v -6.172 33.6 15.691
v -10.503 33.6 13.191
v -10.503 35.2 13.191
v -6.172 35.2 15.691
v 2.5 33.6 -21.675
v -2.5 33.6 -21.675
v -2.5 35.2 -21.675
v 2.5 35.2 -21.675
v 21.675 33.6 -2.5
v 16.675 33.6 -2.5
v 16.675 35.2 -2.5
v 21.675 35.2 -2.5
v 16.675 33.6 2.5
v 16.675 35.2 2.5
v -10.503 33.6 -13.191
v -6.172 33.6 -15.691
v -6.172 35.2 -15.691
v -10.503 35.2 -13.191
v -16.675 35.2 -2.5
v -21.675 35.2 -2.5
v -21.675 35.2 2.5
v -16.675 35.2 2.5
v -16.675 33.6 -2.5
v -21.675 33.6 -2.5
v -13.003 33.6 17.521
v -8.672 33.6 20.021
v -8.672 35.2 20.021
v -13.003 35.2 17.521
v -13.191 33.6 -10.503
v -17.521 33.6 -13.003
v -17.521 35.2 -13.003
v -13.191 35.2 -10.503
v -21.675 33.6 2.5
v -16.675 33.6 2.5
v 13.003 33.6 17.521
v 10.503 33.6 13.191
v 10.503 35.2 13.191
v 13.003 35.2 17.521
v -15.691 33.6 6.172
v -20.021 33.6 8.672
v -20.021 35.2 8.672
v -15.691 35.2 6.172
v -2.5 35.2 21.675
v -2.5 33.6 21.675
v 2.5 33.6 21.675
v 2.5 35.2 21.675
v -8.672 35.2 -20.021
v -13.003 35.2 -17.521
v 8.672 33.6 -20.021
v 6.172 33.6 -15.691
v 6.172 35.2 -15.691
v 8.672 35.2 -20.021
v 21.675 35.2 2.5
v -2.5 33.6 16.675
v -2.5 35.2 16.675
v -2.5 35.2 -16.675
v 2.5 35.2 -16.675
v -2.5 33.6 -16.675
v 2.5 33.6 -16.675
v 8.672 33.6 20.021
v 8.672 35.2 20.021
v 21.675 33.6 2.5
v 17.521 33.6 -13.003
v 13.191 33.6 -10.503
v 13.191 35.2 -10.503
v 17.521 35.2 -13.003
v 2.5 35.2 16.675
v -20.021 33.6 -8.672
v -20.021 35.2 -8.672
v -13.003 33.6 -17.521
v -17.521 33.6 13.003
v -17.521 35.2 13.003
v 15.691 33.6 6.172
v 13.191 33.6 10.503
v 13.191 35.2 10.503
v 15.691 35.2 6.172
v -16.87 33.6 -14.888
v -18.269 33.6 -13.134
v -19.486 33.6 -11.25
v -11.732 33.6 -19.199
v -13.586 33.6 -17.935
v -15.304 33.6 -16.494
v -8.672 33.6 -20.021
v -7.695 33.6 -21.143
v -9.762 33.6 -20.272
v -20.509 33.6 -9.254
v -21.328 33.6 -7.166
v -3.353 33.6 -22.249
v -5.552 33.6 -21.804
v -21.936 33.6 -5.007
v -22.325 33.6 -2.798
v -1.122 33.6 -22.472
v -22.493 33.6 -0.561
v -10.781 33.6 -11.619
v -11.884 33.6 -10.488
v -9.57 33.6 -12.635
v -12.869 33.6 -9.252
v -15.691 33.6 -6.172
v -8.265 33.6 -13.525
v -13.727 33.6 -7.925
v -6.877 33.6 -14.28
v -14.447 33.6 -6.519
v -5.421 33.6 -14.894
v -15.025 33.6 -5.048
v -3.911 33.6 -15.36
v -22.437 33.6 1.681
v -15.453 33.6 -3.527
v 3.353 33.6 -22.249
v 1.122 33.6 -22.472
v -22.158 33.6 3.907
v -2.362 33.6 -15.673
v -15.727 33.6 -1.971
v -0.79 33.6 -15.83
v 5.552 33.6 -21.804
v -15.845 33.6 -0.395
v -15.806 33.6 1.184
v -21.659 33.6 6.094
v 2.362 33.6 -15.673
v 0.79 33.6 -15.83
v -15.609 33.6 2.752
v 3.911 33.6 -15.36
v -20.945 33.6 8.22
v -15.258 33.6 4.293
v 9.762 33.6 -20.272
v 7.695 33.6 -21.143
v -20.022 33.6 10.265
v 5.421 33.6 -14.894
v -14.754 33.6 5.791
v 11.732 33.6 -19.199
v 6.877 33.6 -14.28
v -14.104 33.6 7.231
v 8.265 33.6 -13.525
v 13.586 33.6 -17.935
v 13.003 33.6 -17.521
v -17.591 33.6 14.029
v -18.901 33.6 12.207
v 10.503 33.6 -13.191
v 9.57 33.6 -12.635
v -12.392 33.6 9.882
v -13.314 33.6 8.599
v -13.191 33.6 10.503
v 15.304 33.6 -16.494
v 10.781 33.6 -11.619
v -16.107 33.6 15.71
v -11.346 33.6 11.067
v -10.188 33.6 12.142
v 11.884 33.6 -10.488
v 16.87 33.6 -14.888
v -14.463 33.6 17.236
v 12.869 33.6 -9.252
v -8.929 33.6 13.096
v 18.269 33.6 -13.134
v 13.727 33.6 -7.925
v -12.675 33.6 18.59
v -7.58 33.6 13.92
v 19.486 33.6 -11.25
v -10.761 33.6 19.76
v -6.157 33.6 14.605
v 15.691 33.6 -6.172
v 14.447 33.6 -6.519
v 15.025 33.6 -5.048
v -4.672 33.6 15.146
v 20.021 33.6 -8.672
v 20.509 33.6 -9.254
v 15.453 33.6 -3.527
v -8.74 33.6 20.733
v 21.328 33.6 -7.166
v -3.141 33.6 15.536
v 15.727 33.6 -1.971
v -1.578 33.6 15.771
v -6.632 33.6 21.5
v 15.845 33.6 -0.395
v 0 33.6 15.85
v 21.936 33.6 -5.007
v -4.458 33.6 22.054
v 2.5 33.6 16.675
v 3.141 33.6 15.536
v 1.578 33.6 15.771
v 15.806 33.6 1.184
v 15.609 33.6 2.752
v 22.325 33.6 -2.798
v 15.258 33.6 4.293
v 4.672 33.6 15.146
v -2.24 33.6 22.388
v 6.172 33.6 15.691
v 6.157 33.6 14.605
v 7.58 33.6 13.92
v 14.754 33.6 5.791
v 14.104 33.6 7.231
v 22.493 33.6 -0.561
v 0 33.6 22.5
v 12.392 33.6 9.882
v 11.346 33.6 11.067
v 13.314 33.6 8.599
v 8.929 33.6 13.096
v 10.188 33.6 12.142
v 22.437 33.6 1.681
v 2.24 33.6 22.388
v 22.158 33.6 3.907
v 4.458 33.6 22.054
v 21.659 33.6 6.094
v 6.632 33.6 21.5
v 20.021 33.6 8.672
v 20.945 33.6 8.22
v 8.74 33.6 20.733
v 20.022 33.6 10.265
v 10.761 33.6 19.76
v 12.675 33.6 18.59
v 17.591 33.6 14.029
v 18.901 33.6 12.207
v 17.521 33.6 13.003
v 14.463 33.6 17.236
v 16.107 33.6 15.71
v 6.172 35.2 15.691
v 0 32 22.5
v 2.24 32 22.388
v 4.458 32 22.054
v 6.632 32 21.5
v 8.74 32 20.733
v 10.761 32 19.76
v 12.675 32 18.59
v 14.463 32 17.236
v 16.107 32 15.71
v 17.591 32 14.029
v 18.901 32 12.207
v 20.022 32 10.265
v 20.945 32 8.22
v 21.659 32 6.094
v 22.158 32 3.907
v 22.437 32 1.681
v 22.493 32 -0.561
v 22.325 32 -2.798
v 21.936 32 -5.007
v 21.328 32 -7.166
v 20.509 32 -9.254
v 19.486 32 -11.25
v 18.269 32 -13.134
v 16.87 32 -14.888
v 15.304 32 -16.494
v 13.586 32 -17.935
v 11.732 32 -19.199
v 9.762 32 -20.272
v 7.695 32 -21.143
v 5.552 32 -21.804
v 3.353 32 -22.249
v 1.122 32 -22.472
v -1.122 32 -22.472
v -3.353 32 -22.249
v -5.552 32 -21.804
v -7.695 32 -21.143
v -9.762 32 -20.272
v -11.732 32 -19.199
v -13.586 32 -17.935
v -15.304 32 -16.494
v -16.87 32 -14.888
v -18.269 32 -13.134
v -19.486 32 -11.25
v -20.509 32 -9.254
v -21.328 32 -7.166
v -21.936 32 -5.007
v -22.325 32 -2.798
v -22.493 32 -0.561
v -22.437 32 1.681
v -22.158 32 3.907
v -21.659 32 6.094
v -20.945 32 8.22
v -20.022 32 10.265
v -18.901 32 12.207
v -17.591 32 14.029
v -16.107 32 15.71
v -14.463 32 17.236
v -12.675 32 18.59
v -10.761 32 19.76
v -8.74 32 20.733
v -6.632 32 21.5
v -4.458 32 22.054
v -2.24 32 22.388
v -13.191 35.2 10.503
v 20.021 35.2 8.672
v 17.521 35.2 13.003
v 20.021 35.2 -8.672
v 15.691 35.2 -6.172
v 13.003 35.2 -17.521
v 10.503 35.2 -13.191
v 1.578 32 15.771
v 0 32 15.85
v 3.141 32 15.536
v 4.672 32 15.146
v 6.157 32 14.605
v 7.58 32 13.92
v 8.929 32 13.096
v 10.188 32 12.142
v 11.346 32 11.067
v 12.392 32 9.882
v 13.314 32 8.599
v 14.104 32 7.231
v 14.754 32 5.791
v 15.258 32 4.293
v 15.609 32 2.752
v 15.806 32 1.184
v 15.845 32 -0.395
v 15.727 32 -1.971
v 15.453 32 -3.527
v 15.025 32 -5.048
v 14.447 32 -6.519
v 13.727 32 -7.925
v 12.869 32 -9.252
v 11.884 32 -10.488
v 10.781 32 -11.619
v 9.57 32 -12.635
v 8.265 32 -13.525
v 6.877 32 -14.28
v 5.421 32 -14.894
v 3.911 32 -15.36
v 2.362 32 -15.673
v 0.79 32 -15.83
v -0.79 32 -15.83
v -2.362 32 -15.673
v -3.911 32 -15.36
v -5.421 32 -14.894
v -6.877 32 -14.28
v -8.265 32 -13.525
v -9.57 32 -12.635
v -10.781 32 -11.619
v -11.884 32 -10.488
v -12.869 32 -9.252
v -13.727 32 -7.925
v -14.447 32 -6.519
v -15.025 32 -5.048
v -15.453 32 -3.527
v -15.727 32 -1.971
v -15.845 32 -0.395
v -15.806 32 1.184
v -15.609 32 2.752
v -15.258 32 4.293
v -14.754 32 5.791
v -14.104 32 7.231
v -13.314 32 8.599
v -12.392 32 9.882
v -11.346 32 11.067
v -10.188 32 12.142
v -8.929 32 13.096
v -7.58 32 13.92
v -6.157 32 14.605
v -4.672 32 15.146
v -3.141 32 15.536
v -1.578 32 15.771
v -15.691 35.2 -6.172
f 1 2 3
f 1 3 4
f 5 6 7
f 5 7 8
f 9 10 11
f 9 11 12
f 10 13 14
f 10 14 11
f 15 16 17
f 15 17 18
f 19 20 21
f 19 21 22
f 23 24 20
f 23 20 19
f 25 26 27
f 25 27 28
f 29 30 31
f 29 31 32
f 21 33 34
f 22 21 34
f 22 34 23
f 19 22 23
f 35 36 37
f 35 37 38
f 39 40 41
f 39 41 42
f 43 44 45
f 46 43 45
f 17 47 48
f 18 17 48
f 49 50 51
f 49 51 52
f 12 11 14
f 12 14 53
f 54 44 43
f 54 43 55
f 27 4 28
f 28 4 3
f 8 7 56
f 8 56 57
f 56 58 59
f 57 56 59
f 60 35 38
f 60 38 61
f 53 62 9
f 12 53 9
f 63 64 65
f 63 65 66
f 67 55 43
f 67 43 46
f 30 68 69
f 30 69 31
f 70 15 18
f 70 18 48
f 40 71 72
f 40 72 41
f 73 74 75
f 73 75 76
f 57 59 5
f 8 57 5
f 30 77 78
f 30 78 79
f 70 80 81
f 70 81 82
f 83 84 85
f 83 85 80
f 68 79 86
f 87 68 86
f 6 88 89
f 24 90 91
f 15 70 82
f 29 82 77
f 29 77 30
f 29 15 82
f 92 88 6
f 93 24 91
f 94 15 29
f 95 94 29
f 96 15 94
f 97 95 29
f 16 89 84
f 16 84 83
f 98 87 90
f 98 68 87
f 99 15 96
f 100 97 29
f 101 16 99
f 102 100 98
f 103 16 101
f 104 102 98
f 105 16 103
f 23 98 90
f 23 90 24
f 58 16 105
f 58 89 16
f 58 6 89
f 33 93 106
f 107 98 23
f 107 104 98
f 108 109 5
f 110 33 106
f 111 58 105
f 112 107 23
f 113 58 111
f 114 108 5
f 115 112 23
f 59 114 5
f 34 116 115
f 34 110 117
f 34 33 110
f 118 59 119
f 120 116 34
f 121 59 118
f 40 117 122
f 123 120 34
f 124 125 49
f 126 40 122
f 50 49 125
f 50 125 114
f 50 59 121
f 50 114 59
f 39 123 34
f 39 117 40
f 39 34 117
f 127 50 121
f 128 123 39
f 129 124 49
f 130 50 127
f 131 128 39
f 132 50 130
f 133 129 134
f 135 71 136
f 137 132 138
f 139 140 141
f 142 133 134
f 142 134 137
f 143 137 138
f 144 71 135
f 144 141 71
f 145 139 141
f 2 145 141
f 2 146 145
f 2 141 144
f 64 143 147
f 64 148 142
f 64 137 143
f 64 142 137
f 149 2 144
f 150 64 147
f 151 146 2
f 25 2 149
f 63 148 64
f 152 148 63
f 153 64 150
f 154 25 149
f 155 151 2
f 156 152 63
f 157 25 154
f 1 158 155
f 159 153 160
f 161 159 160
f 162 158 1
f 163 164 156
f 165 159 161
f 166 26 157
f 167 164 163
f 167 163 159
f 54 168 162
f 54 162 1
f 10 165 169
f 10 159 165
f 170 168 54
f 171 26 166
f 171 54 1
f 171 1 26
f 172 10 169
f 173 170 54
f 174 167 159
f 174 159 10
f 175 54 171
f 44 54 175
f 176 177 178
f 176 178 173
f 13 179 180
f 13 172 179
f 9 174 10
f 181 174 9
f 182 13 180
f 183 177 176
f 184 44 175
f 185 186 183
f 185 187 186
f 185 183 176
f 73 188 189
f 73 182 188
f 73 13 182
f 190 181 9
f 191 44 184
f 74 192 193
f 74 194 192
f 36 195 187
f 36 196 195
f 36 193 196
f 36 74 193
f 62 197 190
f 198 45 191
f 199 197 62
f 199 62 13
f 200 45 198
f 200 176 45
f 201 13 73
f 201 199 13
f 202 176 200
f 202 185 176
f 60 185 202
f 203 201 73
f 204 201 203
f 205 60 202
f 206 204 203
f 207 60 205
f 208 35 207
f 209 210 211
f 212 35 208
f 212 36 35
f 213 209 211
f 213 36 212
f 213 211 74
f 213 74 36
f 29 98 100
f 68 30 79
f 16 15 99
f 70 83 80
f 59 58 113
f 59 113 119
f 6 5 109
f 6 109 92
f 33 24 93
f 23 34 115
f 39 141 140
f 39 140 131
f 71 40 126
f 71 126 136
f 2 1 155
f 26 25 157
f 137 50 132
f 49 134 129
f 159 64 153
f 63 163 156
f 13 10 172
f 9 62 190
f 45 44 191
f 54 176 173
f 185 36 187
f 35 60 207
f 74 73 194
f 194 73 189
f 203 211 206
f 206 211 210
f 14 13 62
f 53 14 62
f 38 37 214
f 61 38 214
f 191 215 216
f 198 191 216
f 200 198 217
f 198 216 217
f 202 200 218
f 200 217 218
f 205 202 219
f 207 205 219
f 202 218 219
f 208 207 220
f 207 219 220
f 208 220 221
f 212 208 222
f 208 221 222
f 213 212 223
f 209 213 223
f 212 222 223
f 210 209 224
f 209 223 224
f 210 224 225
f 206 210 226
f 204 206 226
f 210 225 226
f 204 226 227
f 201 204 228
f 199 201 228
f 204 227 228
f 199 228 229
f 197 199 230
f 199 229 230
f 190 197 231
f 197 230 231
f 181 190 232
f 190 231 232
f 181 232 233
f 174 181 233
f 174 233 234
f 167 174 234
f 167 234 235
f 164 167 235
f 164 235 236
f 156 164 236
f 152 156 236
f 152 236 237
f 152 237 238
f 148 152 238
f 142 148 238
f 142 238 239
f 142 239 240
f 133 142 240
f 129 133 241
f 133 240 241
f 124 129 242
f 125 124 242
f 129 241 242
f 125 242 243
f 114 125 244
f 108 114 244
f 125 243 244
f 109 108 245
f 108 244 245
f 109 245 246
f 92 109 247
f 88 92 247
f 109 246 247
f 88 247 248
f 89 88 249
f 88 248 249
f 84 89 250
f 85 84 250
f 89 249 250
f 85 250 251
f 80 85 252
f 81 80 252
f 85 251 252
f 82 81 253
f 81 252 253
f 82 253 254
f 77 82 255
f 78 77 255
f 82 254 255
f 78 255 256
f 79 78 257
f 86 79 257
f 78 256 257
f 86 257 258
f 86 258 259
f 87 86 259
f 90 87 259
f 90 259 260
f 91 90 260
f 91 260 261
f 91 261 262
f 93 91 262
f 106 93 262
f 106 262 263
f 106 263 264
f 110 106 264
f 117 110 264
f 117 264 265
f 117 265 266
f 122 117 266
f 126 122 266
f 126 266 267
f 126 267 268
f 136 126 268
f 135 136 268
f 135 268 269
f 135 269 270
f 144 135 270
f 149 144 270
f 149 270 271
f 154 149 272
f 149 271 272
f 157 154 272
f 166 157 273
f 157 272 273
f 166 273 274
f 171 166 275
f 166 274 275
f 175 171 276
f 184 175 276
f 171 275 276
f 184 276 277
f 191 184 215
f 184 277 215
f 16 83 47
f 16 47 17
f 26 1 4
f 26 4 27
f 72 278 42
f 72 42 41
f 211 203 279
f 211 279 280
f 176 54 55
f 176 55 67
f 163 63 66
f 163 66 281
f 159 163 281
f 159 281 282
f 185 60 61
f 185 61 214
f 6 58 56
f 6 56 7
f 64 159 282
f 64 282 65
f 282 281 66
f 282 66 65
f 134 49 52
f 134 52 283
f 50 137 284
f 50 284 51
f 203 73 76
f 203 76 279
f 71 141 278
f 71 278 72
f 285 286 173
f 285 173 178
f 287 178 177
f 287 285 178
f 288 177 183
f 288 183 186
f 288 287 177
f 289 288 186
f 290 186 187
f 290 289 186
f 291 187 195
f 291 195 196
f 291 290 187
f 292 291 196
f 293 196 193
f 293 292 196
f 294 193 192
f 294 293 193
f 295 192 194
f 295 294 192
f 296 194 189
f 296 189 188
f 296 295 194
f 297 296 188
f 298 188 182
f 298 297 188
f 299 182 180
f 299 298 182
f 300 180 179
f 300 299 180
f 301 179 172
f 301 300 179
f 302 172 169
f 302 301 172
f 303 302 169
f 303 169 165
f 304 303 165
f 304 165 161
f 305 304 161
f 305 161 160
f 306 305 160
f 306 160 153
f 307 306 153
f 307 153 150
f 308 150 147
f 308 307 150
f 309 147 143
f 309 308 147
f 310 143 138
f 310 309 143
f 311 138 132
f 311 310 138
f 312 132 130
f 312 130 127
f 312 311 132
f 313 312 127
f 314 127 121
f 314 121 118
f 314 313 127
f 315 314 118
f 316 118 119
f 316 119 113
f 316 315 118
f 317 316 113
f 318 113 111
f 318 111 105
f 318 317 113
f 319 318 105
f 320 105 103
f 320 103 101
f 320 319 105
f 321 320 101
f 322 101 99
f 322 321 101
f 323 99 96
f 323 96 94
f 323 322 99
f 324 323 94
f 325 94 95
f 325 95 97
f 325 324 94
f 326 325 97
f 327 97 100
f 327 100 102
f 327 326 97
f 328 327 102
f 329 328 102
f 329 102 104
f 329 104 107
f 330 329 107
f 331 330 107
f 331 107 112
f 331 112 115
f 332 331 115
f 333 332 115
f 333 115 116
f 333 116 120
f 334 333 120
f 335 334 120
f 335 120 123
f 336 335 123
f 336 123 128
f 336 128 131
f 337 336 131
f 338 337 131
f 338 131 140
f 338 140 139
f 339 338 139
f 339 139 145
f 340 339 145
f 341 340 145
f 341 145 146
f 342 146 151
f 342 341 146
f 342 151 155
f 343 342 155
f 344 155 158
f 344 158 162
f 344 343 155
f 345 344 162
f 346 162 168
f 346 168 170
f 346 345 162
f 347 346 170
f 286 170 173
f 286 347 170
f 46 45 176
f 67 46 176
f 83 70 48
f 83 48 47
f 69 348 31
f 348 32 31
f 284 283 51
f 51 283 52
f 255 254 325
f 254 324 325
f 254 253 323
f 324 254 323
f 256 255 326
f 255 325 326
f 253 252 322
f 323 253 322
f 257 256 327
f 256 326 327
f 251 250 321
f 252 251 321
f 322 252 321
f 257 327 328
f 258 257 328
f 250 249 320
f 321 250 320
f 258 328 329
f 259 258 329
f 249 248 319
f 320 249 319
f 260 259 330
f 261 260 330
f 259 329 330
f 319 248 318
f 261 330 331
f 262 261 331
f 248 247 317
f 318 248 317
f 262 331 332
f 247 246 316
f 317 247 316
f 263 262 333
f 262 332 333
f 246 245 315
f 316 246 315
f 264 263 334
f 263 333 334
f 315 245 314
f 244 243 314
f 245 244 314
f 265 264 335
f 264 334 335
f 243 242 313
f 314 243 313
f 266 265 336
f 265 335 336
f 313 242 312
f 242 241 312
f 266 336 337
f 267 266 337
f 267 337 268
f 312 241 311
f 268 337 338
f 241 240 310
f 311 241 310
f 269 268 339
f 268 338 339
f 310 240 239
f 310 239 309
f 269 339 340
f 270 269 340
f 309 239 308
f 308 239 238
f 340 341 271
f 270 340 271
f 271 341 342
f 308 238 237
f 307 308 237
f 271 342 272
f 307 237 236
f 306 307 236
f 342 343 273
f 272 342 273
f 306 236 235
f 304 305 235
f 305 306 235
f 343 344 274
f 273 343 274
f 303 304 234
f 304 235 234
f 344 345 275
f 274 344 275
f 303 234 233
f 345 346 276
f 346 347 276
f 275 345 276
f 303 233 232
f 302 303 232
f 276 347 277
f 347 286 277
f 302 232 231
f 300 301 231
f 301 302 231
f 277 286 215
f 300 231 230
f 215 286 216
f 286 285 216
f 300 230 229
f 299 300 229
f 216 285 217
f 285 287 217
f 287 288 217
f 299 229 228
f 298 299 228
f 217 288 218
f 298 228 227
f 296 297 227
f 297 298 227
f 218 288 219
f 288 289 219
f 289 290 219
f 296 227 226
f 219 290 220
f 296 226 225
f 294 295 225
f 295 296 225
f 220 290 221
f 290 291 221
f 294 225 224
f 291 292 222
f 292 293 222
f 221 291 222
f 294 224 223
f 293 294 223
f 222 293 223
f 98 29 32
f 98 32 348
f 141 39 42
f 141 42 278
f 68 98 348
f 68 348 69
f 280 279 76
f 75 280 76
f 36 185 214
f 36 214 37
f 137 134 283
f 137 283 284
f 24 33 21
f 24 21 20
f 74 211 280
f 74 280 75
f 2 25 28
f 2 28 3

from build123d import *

# Parameters (mm, degrees)
PCB_START   = 32
SKETCH1_R   = 22.5
SKETCH1_R_2 = 15.85
PCB_DEPTH   = 1.6
LEDS_START  = 33.6
SKETCH2_W   = 5
SKETCH2_H   = 5
LEDS_DEPTH  = 1.6


with BuildPart() as part:
    # Sketch1 → PCB (new body)
    with BuildSketch(Plane(origin=(0, 0, 0), x_dir=(1, 0, 0), z_dir=(0, 1, 0)).offset(PCB_START)):
        with Locations(Location((0, 0, 0), (0, 0, 270))):
            Circle(SKETCH1_R)
        with Locations(Location((0, 0, 0), (0, 0, 270))):
            Circle(SKETCH1_R_2, mode=Mode.SUBTRACT)
    extrude(amount=PCB_DEPTH)

    # Sketch2 → LEDs (add)
    with BuildSketch(Plane(origin=(0, 0, 0), x_dir=(1, 0, 0), z_dir=(0, 1, 0)).offset(LEDS_START)):
        with Locations((19.175, 0)):
            Rectangle(SKETCH2_W, SKETCH2_H)
        Polygon((15.690973608, -6.172436491), (20.021100627, -8.672436491), (17.521100627, -13.002563509), (13.190973608, -10.502563509), align=None)
        Polygon((10.502563509, -13.190973608), (13.002563509, -17.521100627), (8.672436491, -20.021100627), (6.172436491, -15.690973608), align=None)
        with Locations((0, -19.175)):
            Rectangle(SKETCH2_W, SKETCH2_H)
        Polygon((-6.172436491, -15.690973608), (-8.672436491, -20.021100627), (-13.002563509, -17.521100627), (-10.502563509, -13.190973608), align=None)
        Polygon((-13.190973608, -10.502563509), (-17.521100627, -13.002563509), (-20.021100627, -8.672436491), (-15.690973608, -6.172436491), align=None)
        with Locations((-19.175, 0)):
            Rectangle(SKETCH2_W, SKETCH2_H)
        Polygon((-15.690973608, 6.172436491), (-20.021100627, 8.672436491), (-17.521100627, 13.002563509), (-13.190973608, 10.502563509), align=None)
        Polygon((-10.502563509, 13.190973608), (-13.002563509, 17.521100627), (-8.672436491, 20.021100627), (-6.172436491, 15.690973608), align=None)
        with Locations((0, 19.175)):
            Rectangle(SKETCH2_W, SKETCH2_H)
        Polygon((6.172436491, 15.690973608), (8.672436491, 20.021100627), (13.002563509, 17.521100627), (10.502563509, 13.190973608), align=None)
        Polygon((13.190973608, 10.502563509), (17.521100627, 13.002563509), (20.021100627, 8.672436491), (15.690973608, 6.172436491), align=None)
    extrude(amount=LEDS_DEPTH)


solid = part.part
